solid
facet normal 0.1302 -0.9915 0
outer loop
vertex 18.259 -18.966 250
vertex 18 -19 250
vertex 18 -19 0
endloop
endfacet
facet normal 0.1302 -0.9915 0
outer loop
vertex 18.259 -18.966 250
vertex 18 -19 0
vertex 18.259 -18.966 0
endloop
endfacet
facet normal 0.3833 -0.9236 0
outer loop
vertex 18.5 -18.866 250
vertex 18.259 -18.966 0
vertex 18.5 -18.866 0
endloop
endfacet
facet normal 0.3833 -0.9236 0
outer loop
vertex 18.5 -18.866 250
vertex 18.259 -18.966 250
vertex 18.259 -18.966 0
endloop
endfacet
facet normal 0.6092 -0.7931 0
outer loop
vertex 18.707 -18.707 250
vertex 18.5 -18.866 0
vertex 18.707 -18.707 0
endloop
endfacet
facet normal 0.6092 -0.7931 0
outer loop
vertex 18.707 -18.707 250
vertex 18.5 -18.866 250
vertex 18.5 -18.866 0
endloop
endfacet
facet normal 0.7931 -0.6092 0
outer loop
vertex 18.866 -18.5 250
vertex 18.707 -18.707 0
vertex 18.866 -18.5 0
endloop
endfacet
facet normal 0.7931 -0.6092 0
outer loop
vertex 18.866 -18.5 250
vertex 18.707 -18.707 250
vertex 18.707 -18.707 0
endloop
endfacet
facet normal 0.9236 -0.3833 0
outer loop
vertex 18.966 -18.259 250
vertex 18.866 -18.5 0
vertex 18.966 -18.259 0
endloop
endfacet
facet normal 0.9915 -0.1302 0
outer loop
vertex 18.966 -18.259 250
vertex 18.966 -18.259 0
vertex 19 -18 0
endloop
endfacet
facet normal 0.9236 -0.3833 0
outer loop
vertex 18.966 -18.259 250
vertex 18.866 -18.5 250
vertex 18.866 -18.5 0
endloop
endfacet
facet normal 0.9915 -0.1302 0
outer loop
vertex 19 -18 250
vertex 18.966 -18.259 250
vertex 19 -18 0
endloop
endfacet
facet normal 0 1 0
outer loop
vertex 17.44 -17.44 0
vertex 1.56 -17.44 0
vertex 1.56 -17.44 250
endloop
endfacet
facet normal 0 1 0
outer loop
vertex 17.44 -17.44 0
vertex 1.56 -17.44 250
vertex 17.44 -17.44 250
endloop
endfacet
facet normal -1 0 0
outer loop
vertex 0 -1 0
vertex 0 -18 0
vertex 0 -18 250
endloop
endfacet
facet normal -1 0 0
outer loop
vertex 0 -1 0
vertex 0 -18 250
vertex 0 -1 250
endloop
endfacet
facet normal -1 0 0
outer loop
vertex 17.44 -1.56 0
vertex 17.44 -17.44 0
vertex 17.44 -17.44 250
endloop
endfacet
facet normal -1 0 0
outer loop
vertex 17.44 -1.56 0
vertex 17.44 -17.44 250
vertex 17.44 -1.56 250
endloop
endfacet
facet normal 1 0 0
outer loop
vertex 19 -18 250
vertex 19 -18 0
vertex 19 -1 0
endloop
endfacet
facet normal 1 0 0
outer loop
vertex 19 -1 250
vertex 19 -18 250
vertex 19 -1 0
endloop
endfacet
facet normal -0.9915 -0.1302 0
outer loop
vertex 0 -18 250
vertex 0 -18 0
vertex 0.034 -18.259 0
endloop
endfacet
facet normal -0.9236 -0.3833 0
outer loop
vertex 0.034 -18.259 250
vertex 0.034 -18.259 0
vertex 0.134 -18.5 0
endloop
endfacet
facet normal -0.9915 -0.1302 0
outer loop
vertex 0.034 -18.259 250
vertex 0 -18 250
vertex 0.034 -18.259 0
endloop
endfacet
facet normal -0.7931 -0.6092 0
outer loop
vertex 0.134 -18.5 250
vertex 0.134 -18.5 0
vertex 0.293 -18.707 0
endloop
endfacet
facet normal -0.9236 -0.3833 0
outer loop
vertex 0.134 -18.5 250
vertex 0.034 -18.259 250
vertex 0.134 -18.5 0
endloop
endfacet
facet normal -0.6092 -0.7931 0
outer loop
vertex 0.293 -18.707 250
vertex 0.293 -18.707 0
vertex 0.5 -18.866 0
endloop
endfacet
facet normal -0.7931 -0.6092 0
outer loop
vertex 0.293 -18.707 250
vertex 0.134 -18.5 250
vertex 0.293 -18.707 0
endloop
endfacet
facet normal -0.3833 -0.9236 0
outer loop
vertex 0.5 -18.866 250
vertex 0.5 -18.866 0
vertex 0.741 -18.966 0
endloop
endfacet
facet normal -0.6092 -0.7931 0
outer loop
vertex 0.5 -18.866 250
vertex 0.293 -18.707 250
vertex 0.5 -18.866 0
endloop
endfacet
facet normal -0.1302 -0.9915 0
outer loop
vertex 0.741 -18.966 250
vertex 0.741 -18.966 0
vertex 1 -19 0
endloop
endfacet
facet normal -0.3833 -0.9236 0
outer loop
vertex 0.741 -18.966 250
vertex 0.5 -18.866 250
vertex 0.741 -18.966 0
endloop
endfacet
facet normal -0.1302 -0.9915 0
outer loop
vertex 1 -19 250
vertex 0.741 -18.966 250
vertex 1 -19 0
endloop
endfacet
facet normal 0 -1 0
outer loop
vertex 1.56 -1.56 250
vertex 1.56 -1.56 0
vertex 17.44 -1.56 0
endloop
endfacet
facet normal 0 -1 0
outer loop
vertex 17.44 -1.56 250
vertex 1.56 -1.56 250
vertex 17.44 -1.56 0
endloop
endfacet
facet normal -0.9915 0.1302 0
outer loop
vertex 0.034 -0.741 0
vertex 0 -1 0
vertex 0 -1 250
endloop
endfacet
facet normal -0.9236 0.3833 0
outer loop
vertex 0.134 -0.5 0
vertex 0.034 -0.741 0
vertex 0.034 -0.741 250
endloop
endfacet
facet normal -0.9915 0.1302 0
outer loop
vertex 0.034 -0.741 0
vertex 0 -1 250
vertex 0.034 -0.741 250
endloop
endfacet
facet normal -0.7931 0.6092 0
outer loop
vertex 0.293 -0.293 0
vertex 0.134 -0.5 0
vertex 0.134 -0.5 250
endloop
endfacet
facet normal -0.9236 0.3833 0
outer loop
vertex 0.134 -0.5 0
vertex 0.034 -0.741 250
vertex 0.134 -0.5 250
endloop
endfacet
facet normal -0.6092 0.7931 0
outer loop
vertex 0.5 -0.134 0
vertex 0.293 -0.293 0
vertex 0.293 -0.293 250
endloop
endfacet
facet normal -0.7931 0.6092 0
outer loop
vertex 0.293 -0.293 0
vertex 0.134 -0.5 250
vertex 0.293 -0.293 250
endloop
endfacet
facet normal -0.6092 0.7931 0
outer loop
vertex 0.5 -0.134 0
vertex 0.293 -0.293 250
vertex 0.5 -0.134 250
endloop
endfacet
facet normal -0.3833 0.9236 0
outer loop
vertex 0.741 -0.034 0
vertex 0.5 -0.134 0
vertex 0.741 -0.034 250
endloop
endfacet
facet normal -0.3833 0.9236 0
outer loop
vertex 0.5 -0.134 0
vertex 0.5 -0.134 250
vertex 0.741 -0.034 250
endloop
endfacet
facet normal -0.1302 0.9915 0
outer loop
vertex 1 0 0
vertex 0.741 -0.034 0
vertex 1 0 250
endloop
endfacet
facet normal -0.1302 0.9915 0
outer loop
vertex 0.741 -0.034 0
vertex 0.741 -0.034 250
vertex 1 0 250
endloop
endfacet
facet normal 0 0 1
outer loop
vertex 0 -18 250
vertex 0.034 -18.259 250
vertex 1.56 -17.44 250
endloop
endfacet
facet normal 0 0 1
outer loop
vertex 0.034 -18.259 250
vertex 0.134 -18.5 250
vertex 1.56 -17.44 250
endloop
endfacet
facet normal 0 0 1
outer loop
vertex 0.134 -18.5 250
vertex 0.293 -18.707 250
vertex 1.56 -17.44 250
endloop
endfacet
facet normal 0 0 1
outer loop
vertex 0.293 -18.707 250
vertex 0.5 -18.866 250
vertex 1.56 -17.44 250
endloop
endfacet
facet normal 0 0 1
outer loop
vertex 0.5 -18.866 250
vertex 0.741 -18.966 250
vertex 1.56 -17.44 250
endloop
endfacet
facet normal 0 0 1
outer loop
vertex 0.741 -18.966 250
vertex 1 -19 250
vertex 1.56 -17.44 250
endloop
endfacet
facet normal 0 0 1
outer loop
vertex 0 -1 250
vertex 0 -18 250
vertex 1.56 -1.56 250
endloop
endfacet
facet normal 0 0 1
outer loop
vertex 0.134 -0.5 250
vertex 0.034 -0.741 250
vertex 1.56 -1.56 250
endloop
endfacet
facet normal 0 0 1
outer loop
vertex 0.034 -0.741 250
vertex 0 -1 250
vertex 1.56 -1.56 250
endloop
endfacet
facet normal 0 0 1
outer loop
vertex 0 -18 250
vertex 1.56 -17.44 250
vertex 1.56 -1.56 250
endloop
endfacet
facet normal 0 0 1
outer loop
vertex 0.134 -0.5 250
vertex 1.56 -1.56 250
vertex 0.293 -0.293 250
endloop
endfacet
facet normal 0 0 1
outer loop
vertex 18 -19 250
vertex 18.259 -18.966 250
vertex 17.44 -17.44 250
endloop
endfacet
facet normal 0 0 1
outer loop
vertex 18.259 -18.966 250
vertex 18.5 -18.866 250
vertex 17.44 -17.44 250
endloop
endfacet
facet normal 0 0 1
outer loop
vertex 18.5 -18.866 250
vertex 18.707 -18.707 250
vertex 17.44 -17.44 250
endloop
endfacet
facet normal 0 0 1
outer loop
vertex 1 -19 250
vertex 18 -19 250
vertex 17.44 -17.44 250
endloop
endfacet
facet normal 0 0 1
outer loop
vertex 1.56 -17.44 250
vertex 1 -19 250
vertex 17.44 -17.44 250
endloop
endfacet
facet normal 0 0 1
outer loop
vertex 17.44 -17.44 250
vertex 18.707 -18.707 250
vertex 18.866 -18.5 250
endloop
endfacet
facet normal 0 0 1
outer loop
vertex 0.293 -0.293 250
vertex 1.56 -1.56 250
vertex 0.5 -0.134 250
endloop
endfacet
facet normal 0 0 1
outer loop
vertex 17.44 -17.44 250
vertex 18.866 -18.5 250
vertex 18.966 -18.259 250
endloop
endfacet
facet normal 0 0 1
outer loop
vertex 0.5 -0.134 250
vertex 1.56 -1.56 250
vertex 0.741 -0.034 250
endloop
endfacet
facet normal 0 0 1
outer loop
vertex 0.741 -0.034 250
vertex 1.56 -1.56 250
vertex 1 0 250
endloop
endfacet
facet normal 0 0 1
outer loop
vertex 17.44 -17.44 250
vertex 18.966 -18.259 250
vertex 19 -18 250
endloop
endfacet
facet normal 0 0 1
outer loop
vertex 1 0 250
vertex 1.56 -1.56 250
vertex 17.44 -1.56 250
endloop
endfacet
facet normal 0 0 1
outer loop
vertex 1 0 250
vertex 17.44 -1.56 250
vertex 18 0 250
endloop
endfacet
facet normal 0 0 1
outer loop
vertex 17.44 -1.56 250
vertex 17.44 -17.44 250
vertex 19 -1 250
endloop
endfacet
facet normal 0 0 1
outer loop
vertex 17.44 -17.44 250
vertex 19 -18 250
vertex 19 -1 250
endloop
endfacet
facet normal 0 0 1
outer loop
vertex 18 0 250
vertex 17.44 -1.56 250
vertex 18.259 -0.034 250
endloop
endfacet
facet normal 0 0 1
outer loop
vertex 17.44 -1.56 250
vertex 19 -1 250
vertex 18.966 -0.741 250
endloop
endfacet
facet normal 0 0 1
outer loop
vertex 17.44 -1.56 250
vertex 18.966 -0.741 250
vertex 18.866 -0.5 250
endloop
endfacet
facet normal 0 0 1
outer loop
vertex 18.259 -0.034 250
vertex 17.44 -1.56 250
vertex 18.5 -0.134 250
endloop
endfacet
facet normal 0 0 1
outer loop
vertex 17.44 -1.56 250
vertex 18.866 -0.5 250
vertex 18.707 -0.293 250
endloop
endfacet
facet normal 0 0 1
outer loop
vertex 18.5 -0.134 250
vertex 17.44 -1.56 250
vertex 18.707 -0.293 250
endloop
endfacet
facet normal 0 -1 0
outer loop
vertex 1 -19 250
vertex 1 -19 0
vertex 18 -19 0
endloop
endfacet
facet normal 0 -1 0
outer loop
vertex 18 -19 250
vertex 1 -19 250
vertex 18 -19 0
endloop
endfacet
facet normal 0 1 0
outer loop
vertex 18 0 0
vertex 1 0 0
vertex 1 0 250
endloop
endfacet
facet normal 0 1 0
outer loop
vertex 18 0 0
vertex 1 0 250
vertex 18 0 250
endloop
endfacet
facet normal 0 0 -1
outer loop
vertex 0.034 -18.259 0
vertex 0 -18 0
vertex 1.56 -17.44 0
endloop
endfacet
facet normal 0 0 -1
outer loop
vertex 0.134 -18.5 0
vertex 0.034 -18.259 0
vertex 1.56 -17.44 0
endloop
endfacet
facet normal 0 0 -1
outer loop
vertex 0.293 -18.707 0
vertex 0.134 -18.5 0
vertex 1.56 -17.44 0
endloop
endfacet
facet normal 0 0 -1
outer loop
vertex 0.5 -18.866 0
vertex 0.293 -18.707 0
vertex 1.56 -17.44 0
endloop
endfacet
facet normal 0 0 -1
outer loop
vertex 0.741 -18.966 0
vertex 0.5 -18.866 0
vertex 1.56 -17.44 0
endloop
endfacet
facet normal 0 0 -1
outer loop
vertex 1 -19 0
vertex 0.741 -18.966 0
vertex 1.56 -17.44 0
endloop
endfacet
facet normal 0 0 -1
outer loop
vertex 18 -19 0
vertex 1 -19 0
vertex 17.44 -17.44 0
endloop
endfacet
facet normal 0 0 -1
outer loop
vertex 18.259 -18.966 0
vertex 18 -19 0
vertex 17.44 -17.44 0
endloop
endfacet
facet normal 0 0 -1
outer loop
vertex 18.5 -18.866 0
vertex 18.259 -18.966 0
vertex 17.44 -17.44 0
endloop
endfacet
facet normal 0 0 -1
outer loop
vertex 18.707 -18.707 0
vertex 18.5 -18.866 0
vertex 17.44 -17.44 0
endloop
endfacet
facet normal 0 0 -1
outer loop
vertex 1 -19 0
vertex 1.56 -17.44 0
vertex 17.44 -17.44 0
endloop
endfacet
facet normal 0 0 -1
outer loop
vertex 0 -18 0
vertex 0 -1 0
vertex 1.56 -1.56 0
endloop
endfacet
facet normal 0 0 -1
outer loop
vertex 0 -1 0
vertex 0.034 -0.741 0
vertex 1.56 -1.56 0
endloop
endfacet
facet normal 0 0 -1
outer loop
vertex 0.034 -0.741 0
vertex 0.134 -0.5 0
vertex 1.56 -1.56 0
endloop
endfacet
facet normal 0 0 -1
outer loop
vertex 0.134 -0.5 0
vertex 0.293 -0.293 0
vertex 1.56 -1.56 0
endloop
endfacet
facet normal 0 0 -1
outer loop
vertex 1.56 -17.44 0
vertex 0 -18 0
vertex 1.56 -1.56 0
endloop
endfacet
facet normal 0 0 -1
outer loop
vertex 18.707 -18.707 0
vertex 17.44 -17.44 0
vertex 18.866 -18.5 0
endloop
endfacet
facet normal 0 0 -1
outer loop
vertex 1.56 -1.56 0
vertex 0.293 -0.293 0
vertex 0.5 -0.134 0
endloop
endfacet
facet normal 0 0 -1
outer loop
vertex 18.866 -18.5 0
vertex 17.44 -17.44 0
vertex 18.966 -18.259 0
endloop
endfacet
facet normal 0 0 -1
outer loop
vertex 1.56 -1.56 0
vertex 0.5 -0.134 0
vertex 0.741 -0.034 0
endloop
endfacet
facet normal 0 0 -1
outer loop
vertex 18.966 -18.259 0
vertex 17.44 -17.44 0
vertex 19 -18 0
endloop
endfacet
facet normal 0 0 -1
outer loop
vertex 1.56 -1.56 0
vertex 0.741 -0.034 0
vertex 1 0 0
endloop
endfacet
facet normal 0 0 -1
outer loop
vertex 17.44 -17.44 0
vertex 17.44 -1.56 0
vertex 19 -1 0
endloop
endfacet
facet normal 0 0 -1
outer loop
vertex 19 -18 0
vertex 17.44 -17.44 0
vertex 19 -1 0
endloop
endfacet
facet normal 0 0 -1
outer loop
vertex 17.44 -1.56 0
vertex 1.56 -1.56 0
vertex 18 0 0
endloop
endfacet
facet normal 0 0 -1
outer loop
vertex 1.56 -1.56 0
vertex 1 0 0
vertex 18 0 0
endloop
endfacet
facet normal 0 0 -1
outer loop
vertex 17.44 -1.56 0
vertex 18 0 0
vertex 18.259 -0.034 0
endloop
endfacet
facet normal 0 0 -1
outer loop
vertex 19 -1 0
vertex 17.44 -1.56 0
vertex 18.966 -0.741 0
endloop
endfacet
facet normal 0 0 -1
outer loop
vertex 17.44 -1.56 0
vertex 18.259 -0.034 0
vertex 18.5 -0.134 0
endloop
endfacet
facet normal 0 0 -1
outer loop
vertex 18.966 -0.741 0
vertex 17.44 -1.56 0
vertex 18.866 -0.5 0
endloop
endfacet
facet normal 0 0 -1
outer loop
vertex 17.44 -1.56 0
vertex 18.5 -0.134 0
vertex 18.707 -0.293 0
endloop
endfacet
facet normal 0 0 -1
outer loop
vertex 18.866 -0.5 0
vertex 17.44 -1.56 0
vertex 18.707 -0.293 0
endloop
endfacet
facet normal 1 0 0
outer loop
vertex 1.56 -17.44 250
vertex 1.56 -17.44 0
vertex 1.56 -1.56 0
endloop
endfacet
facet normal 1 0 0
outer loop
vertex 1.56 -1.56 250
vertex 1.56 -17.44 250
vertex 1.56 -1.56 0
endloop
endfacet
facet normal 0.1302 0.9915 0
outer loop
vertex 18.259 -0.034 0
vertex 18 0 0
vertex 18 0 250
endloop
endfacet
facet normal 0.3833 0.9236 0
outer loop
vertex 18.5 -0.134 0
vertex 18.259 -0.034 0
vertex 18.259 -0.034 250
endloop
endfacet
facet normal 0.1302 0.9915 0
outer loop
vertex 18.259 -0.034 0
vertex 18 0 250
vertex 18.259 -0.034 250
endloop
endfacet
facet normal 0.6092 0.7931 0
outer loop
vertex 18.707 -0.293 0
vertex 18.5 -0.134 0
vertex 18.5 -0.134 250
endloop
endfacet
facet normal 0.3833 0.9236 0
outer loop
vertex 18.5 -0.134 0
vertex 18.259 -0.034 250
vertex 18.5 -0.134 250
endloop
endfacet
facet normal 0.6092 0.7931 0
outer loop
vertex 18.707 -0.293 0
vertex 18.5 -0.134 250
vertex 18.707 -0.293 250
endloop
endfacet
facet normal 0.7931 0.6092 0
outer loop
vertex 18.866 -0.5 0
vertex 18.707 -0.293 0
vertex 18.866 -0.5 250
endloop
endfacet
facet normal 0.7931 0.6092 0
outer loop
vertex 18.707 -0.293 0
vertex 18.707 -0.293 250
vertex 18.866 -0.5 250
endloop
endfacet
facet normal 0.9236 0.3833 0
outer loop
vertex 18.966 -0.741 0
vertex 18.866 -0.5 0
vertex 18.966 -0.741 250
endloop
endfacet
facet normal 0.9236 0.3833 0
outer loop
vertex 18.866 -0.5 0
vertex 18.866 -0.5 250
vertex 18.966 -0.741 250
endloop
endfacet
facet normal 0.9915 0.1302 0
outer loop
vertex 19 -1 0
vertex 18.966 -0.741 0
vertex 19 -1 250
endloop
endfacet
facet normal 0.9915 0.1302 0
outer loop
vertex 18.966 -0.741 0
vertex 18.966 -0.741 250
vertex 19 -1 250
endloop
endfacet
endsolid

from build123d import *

# Parameters (mm, degrees)
SKETCH_1_W          = 19
SKETCH_1_H          = 19
SKETCH_1_W_2        = 15.88
SKETCH_1_H_2        = 15.88
EXTRUDE_1_DEPTH     = 900
FILLET_2_R          = 1
SKETCH_2_W          = 650
SKETCH_2_H          = 19
CUT_EXTRUDE_2_DEPTH = 51


with BuildPart() as part:
    # 스케치1 → 보스-돌출1 (new body)
    with BuildSketch(Plane.XY):
        with Locations((9.5, -9.5)):
            Rectangle(SKETCH_1_W, SKETCH_1_H)
        with Locations((9.5, -9.5)):
            Rectangle(SKETCH_1_W_2, SKETCH_1_H_2, mode=Mode.SUBTRACT)
    extrude(amount=EXTRUDE_1_DEPTH)

    # 필렛2
    fillet_2_edges = [part.edges().sort_by_distance(p)[0] for p in [
        (0, 0, 450),
        (19, 0, 450),
        (19, -19, 450),
        (0, -19, 450),
    ]]
    fillet(fillet_2_edges, radius=FILLET_2_R)

    # 스케치2 → 컷-돌출2 (cut)
    with BuildSketch(Plane(origin=(19, 0, 0), x_dir=(0, 0, -1), z_dir=(1, 0, 0))):
        with Locations((-575, -9.5)):
            Rectangle(SKETCH_2_W, SKETCH_2_H)
    extrude(amount=-CUT_EXTRUDE_2_DEPTH, mode=Mode.SUBTRACT)


solid = part.part
